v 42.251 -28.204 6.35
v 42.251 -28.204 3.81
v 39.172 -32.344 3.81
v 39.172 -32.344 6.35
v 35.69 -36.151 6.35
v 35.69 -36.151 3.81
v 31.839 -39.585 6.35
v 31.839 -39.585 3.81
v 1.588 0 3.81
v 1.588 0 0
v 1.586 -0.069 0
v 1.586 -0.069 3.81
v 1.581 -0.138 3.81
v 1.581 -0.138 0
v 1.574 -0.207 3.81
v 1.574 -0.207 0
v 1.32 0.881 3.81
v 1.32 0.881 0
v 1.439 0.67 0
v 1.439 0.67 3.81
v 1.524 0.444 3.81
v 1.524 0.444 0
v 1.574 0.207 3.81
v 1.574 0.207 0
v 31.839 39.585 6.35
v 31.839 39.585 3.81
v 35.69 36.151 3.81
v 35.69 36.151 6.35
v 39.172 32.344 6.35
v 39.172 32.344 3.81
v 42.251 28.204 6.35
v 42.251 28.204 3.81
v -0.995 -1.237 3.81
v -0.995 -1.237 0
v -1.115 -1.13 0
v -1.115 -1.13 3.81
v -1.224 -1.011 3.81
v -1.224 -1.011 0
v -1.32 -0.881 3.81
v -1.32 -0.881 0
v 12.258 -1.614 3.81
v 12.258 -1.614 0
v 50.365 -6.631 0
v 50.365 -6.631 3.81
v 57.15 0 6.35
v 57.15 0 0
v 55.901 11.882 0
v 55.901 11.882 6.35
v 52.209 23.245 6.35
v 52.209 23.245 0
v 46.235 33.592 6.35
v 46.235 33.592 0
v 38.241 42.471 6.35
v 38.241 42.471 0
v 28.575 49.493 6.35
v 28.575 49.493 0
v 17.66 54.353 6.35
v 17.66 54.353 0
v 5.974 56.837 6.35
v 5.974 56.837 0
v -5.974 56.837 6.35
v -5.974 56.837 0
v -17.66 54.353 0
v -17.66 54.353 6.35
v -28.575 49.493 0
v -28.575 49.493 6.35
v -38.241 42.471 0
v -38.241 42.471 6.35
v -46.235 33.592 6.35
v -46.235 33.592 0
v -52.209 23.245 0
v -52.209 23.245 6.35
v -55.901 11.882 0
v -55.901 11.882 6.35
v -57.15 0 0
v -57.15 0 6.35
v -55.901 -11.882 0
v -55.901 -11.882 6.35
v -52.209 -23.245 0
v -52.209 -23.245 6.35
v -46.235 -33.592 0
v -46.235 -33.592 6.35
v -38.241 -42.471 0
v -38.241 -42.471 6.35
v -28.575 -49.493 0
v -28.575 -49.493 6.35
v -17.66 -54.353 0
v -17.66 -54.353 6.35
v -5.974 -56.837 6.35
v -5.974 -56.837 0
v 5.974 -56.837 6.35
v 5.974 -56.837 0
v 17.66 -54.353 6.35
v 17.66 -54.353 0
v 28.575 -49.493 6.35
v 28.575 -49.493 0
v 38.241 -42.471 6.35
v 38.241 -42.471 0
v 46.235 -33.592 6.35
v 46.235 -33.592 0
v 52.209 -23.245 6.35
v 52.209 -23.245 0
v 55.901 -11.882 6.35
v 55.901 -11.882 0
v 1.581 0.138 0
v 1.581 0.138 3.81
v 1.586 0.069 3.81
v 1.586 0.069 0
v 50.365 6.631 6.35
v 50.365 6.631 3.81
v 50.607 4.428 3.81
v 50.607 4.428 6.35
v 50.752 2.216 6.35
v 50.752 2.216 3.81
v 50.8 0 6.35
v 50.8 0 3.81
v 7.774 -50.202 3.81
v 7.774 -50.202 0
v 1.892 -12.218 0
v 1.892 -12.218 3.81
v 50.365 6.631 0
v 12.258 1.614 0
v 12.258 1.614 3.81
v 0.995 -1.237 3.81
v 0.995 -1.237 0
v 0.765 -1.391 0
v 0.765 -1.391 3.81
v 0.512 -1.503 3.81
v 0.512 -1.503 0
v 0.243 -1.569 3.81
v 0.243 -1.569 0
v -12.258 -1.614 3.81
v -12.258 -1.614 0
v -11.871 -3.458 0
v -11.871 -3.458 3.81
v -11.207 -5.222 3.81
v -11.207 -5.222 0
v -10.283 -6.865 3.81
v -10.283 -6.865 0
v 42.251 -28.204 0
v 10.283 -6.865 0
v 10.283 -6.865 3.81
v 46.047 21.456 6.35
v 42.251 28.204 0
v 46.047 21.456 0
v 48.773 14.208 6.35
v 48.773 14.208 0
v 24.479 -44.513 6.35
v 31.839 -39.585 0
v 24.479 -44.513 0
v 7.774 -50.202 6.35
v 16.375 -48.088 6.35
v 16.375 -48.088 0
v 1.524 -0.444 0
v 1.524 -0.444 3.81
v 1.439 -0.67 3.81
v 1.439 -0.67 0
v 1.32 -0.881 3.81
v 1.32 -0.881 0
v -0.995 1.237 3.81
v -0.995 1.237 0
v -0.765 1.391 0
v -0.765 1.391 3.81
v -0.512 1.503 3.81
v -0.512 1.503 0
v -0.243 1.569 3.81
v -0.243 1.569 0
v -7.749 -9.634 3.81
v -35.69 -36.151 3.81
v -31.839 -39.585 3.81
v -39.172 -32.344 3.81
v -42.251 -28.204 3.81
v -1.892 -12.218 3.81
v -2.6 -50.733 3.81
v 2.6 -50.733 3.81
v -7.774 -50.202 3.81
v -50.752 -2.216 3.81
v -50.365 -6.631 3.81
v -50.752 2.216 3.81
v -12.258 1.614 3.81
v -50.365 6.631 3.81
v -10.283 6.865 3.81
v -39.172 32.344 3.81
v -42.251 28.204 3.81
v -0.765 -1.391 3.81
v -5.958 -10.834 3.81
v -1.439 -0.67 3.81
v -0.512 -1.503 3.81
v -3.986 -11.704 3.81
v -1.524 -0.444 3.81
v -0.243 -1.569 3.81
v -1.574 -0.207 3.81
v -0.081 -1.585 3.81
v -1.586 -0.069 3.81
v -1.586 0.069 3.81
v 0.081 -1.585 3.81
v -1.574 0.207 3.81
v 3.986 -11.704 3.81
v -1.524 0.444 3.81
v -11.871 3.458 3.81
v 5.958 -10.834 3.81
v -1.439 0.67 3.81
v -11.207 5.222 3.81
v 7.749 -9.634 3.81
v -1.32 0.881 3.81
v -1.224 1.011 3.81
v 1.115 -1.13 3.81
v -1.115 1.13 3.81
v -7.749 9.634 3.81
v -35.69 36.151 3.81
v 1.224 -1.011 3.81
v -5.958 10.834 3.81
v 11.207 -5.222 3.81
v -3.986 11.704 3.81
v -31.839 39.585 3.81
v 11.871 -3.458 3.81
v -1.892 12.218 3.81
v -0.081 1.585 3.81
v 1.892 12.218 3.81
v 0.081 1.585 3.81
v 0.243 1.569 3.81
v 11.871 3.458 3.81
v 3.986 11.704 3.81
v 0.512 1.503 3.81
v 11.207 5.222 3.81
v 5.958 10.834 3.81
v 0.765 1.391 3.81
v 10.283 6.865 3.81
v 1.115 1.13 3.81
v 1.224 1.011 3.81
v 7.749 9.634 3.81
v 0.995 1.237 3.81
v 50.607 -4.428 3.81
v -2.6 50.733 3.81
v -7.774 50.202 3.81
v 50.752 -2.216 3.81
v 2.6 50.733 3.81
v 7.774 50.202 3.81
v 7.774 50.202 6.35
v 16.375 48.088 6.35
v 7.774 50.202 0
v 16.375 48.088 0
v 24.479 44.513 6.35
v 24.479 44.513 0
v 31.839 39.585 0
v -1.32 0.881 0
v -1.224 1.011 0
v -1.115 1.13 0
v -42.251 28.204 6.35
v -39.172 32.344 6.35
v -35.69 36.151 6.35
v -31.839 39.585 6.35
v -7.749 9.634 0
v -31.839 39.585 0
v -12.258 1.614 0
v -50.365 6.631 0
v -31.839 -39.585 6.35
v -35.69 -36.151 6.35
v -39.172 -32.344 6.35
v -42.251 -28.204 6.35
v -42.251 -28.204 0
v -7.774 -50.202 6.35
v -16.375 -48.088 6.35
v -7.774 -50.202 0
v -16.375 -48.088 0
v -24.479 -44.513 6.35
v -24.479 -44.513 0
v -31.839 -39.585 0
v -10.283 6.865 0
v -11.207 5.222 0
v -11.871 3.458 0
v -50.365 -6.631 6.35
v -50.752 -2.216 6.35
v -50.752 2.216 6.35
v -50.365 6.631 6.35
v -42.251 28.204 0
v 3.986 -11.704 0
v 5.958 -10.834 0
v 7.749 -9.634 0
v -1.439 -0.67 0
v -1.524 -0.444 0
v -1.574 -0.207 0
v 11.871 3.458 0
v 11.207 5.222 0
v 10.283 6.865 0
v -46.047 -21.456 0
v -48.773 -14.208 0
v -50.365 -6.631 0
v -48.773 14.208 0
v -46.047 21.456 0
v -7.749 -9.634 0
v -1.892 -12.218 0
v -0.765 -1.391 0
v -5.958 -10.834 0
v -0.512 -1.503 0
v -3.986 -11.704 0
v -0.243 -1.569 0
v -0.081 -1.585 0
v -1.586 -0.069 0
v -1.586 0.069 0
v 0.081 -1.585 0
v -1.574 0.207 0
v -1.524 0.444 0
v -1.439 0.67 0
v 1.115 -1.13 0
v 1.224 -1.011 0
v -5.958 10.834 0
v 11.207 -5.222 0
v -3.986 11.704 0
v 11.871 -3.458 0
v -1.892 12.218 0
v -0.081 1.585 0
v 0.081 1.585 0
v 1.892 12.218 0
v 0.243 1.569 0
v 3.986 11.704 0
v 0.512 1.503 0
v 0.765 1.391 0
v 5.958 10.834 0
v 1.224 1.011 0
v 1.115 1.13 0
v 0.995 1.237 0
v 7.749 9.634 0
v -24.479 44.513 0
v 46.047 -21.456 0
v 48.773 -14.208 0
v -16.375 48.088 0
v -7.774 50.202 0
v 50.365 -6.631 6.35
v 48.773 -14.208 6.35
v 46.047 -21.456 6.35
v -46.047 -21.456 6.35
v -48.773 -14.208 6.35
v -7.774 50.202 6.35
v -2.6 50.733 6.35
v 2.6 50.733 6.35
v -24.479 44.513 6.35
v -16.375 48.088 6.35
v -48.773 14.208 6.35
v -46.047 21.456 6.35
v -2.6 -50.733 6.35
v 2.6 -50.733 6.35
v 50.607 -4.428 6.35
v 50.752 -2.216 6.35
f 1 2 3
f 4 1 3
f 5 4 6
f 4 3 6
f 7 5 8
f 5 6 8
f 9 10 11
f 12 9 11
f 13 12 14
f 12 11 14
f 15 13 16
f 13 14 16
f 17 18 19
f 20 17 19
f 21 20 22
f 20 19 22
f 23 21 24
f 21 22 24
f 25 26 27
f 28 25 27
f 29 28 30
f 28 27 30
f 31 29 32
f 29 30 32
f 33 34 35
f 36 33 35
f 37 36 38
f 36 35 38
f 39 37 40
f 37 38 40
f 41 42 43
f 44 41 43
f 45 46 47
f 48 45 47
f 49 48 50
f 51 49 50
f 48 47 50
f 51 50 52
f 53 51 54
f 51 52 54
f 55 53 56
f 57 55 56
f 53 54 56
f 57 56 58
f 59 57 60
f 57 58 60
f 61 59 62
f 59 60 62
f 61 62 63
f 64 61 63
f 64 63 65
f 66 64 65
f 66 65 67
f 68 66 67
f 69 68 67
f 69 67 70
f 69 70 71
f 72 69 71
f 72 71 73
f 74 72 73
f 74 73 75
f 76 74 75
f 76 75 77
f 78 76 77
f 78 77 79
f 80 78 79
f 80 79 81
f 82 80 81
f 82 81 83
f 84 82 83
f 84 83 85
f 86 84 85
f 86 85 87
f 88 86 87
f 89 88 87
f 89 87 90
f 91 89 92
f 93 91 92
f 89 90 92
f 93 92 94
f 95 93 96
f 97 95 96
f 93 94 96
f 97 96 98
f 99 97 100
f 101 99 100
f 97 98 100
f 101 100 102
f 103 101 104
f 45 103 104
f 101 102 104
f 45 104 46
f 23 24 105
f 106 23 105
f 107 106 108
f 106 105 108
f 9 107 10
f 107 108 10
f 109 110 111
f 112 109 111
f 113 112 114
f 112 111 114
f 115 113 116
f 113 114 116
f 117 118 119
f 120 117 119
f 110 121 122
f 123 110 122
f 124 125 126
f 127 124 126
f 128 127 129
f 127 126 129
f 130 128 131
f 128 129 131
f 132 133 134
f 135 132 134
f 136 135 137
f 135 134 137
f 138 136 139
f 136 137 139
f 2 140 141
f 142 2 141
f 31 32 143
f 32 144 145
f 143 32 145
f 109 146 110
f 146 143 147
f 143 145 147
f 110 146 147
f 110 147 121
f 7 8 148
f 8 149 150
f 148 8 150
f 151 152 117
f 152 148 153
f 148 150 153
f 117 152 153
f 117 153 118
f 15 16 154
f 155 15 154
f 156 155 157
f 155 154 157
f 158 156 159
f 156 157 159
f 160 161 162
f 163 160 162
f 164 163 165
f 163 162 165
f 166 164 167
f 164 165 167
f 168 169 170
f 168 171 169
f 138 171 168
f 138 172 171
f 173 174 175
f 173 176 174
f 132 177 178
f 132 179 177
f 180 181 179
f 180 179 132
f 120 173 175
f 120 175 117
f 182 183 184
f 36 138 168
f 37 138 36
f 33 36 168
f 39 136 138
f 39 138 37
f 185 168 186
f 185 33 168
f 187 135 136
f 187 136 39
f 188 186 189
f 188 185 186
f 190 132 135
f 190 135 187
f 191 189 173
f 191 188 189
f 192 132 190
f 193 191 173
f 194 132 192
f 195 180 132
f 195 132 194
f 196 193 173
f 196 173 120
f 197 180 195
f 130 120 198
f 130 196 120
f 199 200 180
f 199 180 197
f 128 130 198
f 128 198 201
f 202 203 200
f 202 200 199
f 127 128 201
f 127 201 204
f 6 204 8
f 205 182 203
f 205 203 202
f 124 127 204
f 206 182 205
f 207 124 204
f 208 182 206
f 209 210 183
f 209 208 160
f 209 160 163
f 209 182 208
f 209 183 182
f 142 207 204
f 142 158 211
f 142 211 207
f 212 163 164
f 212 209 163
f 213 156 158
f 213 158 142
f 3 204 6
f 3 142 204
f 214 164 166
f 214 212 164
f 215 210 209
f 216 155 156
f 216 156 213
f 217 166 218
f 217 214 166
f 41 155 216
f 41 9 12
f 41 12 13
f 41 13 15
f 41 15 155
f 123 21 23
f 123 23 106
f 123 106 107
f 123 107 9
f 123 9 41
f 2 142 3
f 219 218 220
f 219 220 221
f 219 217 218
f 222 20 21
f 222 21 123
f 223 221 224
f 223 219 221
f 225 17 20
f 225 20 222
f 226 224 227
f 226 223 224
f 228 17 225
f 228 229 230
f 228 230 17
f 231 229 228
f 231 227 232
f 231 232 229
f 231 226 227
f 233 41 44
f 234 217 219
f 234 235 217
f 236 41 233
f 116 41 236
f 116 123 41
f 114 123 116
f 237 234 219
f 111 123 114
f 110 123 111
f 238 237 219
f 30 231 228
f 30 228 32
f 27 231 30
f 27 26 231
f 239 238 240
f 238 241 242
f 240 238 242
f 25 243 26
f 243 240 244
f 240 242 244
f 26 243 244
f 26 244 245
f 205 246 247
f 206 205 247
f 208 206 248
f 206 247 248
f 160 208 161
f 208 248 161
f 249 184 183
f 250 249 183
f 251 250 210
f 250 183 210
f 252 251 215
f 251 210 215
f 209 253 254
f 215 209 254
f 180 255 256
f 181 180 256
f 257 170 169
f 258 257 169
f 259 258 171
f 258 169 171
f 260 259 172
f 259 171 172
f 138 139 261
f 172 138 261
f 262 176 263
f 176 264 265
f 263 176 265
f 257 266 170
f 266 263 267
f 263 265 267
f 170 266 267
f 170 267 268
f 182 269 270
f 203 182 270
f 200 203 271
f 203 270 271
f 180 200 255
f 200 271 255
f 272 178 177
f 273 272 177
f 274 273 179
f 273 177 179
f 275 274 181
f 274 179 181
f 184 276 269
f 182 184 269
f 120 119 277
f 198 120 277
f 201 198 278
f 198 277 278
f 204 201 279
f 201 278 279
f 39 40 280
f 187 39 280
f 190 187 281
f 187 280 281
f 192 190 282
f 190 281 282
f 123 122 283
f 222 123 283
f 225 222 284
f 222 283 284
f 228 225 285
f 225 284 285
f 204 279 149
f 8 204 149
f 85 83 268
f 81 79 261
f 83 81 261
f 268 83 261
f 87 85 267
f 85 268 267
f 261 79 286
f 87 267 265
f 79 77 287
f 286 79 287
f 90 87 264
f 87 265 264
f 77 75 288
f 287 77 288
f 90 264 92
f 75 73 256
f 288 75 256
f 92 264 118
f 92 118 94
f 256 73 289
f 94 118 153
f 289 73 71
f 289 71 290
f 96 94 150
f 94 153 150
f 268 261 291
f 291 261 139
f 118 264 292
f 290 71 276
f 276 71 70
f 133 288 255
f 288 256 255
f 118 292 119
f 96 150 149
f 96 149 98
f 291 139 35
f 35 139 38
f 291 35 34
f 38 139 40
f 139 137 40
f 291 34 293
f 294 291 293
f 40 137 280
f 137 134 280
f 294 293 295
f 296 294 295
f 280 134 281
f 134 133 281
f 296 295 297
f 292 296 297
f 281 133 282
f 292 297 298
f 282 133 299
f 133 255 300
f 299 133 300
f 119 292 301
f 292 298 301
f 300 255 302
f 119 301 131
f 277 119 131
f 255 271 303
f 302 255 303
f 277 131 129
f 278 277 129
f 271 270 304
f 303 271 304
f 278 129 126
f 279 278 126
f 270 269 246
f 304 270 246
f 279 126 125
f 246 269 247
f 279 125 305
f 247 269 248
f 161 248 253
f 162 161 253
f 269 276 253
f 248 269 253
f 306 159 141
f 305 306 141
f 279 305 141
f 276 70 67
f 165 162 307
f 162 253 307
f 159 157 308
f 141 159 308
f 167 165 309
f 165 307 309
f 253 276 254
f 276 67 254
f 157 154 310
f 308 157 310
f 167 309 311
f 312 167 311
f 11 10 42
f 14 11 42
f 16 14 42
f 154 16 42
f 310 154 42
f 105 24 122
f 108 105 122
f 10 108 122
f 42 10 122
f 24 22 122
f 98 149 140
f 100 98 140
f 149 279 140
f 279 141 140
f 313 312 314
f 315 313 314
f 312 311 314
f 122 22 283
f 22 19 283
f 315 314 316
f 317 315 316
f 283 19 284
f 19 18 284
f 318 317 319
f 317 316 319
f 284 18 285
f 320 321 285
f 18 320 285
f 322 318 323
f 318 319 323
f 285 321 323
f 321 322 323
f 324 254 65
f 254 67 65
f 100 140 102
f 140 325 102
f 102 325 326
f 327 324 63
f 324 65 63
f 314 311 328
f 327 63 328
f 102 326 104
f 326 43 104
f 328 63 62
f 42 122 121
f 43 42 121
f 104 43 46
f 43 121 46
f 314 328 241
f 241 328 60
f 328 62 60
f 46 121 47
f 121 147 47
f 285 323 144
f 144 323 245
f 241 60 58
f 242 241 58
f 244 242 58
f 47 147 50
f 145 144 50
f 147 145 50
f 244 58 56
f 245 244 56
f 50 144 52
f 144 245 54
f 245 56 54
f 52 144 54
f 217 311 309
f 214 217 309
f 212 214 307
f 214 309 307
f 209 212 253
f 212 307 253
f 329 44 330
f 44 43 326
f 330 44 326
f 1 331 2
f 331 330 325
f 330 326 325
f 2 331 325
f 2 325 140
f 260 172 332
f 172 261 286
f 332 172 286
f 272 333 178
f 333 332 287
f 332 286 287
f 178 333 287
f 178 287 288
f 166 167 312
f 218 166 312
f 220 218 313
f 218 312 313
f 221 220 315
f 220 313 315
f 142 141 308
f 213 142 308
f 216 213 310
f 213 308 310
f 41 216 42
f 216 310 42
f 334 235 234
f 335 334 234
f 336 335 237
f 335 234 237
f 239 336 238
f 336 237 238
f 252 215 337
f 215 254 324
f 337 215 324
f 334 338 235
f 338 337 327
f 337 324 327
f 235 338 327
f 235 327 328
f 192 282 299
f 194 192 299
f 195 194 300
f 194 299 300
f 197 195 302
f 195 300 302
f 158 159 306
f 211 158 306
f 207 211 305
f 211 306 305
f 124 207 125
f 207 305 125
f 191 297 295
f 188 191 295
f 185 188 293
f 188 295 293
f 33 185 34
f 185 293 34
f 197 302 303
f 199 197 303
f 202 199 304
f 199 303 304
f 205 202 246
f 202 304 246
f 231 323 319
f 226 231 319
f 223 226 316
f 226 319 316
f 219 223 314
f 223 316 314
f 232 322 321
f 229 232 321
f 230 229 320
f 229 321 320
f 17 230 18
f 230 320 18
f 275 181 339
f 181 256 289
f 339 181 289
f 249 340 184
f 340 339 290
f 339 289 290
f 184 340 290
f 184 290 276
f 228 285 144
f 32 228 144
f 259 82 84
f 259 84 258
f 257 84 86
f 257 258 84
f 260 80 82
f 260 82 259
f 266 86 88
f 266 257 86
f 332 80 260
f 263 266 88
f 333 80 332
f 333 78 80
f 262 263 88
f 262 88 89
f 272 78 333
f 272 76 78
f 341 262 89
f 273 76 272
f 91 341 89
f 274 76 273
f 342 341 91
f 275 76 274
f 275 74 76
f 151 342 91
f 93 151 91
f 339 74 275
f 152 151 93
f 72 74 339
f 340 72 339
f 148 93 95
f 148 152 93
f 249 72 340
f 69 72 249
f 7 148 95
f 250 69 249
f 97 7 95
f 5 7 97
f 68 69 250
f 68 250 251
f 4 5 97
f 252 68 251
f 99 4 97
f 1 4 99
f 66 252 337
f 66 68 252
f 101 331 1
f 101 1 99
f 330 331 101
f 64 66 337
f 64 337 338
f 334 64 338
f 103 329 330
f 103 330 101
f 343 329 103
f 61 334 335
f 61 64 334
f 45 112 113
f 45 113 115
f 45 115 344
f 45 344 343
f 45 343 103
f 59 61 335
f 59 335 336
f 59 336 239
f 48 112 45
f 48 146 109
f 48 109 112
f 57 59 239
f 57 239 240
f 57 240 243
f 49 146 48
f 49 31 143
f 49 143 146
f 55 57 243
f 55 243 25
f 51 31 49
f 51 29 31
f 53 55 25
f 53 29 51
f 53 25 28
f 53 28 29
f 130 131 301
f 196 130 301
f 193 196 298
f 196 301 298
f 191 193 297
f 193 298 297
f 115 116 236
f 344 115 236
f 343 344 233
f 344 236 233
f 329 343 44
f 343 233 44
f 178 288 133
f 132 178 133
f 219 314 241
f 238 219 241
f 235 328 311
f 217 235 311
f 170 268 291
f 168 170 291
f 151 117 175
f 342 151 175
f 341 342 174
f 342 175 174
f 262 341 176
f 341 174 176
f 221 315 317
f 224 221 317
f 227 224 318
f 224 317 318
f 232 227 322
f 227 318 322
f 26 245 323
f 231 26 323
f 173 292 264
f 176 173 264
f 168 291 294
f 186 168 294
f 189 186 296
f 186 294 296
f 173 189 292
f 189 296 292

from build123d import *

# Parameters (mm, degrees)
F0_R     = 57.15
F1_DEPTH = 6.35
F2_DEPTH = 3.81


with BuildPart() as f1:
    # F0 (on Top) → F1 (new body)
    with BuildSketch(Plane.XY):
        Circle(F0_R)
        with BuildLine():
            ThreePointArc((50.3653989578, 6.6307305648), (50.6912333005, 3.3224789649), (50.8, 0))
            ThreePointArc((50.8, 0), (50.6912333005, -3.3224789649), (50.3653989578, -6.6307305648))
            ThreePointArc((50.3653989578, -6.6307305648), (47.547955486, -17.8838454786), (42.2510665707, -28.2043857164))
            ThreePointArc((42.2510665707, -28.2043857164), (37.479329155, -34.2919799092), (31.8386895146, -39.5845658053))
            ThreePointArc((31.8386895146, -39.5845658053), (20.505293032, -46.4776608455), (7.7737455542, -50.2016820441))
            ThreePointArc((7.7737455542, -50.2016820441), (0, -50.8), (-7.7737455542, -50.2016820441))
            ThreePointArc((-7.7737455542, -50.2016820441), (-20.505293032, -46.4776608455), (-31.8386895146, -39.5845658053))
            ThreePointArc((-31.8386895146, -39.5845658053), (-37.479329155, -34.2919799092), (-42.2510665707, -28.2043857164))
            ThreePointArc((-42.2510665707, -28.2043857164), (-47.547955486, -17.8838454786), (-50.3653989578, -6.6307305648))
            ThreePointArc((-50.3653989578, -6.6307305648), (-50.8, 0), (-50.3653989578, 6.6307305648))
            ThreePointArc((-50.3653989578, 6.6307305648), (-47.547955486, 17.8838454786), (-42.2510665707, 28.2043857164))
            ThreePointArc((-42.2510665707, 28.2043857164), (-37.479329155, 34.2919799092), (-31.8386895146, 39.5845658053))
            ThreePointArc((-31.8386895146, 39.5845658053), (-20.505293032, 46.4776608455), (-7.7737455542, 50.2016820441))
            ThreePointArc((-7.7737455542, 50.2016820441), (0, 50.8), (7.7737455542, 50.2016820441))
            ThreePointArc((7.7737455542, 50.2016820441), (20.505293032, 46.4776608455), (31.8386895146, 39.5845658053))
            ThreePointArc((31.8386895146, 39.5845658053), (37.479329155, 34.2919799092), (42.2510665707, 28.2043857164))
            ThreePointArc((42.2510665707, 28.2043857164), (47.547955486, 17.8838454786), (50.3653989578, 6.6307305648))
        make_face(mode=Mode.SUBTRACT)
    extrude(amount=F1_DEPTH)

    # F0 (on Top) → F2 (join)
    with BuildSketch(Plane.XY):
        Circle(F0_R)
        with BuildLine():
            ThreePointArc((50.3653989578, 6.6307305648), (50.6912333005, 3.3224789649), (50.8, 0))
            ThreePointArc((50.8, 0), (50.6912333005, -3.3224789649), (50.3653989578, -6.6307305648))
            ThreePointArc((50.3653989578, -6.6307305648), (47.547955486, -17.8838454786), (42.2510665707, -28.2043857164))
            ThreePointArc((42.2510665707, -28.2043857164), (37.479329155, -34.2919799092), (31.8386895146, -39.5845658053))
            ThreePointArc((31.8386895146, -39.5845658053), (20.505293032, -46.4776608455), (7.7737455542, -50.2016820441))
            ThreePointArc((7.7737455542, -50.2016820441), (0, -50.8), (-7.7737455542, -50.2016820441))
            ThreePointArc((-7.7737455542, -50.2016820441), (-20.505293032, -46.4776608455), (-31.8386895146, -39.5845658053))
            ThreePointArc((-31.8386895146, -39.5845658053), (-37.479329155, -34.2919799092), (-42.2510665707, -28.2043857164))
            ThreePointArc((-42.2510665707, -28.2043857164), (-47.547955486, -17.8838454786), (-50.3653989578, -6.6307305648))
            ThreePointArc((-50.3653989578, -6.6307305648), (-50.8, 0), (-50.3653989578, 6.6307305648))
            ThreePointArc((-50.3653989578, 6.6307305648), (-47.547955486, 17.8838454786), (-42.2510665707, 28.2043857164))
            ThreePointArc((-42.2510665707, 28.2043857164), (-37.479329155, 34.2919799092), (-31.8386895146, 39.5845658053))
            ThreePointArc((-31.8386895146, 39.5845658053), (-20.505293032, 46.4776608455), (-7.7737455542, 50.2016820441))
            ThreePointArc((-7.7737455542, 50.2016820441), (0, 50.8), (7.7737455542, 50.2016820441))
            ThreePointArc((7.7737455542, 50.2016820441), (20.505293032, 46.4776608455), (31.8386895146, 39.5845658053))
            ThreePointArc((31.8386895146, 39.5845658053), (37.479329155, 34.2919799092), (42.2510665707, 28.2043857164))
            ThreePointArc((42.2510665707, 28.2043857164), (47.547955486, 17.8838454786), (50.3653989578, 6.6307305648))
        make_face(mode=Mode.SUBTRACT)
        with BuildLine():
            Line((-7.7491279332, 9.6343746957), (-31.8386895146, 39.5845658053))
            ThreePointArc((-31.8386895146, 39.5845658053), (-37.479329155, 34.2919799092), (-42.2510665707, 28.2043857164))
            Line((-42.2510665707, 28.2043857164), (-10.2833667202, 6.8645850858))
            ThreePointArc((-10.2833667202, 6.8645850858), (-9.1219871452, 8.3462272929), (-7.7491279332, 9.6343746957))
        make_face()
        with BuildLine():
            Line((1.8920297832, 12.2184443691), (7.7737455542, 50.2016820441))
            ThreePointArc((7.7737455542, 50.2016820441), (0, 50.8), (-7.7737455542, 50.2016820441))
            Line((-7.7737455542, 50.2016820441), (-1.8920297832, 12.2184443691))
            ThreePointArc((-1.8920297832, 12.2184443691), (0, 12.3640672718), (1.8920297832, 12.2184443691))
        make_face()
        with BuildLine():
            Line((10.2833667202, 6.8645850858), (42.2510665707, 28.2043857164))
            ThreePointArc((42.2510665707, 28.2043857164), (37.479329155, 34.2919799092), (31.8386895146, 39.5845658053))
            Line((31.8386895146, 39.5845658053), (7.7491279332, 9.6343746957))
            ThreePointArc((7.7491279332, 9.6343746957), (9.1219871452, 8.3462272929), (10.2833667202, 6.8645850858))
        make_face()
        with BuildLine():
            ThreePointArc((50.3653989578, -6.6307305648), (50.6912333005, -3.3224789649), (50.8, 0))
            ThreePointArc((50.8, 0), (50.6912333005, 3.3224789649), (50.3653989578, 6.6307305648))
            Line((50.3653989578, 6.6307305648), (12.2582909623, 1.6138346213))
            ThreePointArc((12.2582909623, 1.6138346213), (12.3375948547, 0.8086486896), (12.3640672718, 0))
            ThreePointArc((12.3640672718, 0), (12.3375948547, -0.8086486896), (12.2582909623, -1.6138346213))
            Line((12.2582909623, -1.6138346213), (50.3653989578, -6.6307305648))
        make_face()
        with BuildLine():
            ThreePointArc((31.8386895146, -39.5845658053), (37.479329155, -34.2919799092), (42.2510665707, -28.2043857164))
            Line((42.2510665707, -28.2043857164), (10.2833667202, -6.8645850858))
            ThreePointArc((10.2833667202, -6.8645850858), (9.1219871452, -8.3462272929), (7.7491279332, -9.6343746957))
            Line((7.7491279332, -9.6343746957), (31.8386895146, -39.5845658053))
        make_face()
        with BuildLine():
            ThreePointArc((-7.7737455542, -50.2016820441), (0, -50.8), (7.7737455542, -50.2016820441))
            Line((7.7737455542, -50.2016820441), (1.8920297832, -12.2184443691))
            ThreePointArc((1.8920297832, -12.2184443691), (0, -12.3640672718), (-1.8920297832, -12.2184443691))
            Line((-1.8920297832, -12.2184443691), (-7.7737455542, -50.2016820441))
        make_face()
        with BuildLine():
            Line((-31.8386895146, -39.5845658053), (-7.7491279332, -9.6343746957))
            ThreePointArc((-7.7491279332, -9.6343746957), (-9.1219871452, -8.3462272929), (-10.2833667202, -6.8645850858))
            Line((-10.2833667202, -6.8645850858), (-42.2510665707, -28.2043857164))
            ThreePointArc((-42.2510665707, -28.2043857164), (-37.479329155, -34.2919799092), (-31.8386895146, -39.5845658053))
        make_face()
        with BuildLine():
            ThreePointArc((-12.2582909623, -1.6138346213), (-12.3640672718, 0), (-12.2582909623, 1.6138346213))
            Line((-12.2582909623, 1.6138346213), (-50.3653989578, 6.6307305648))
            ThreePointArc((-50.3653989578, 6.6307305648), (-50.8, 0), (-50.3653989578, -6.6307305648))
            Line((-50.3653989578, -6.6307305648), (-12.2582909623, -1.6138346213))
        make_face()
        with BuildLine():
            ThreePointArc((1.8920297832, -12.2184443691), (4.9907248519, -11.3120654592), (7.7491279332, -9.6343746957))
            Line((7.7491279332, -9.6343746957), (0.9949590473, -1.2370176814))
            ThreePointArc((0.9949590473, -1.2370176814), (0.6407904073, -1.4524269014), (0.2429295486, -1.5688025639))
            Line((0.2429295486, -1.5688025639), (1.8920297832, -12.2184443691))
        make_face()
        with BuildLine():
            ThreePointArc((10.2833667202, -6.8645850858), (11.5725614225, -4.3526982003), (12.2582909623, -1.6138346213))
            Line((12.2582909623, -1.6138346213), (1.5739187174, -0.2072103301))
            ThreePointArc((1.5739187174, -0.2072103301), (1.4858736089, -0.5588701712), (1.3203458303, -0.8813870536))
            Line((1.3203458303, -0.8813870536), (10.2833667202, -6.8645850858))
        make_face()
        with BuildLine():
            Line((1.5739187174, 0.2072103301), (12.2582909623, 1.6138346213))
            ThreePointArc((12.2582909623, 1.6138346213), (11.5725614225, 4.3526982003), (10.2833667202, 6.8645850858))
            Line((10.2833667202, 6.8645850858), (1.3203458303, 0.8813870536))
            ThreePointArc((1.3203458303, 0.8813870536), (1.4858736089, 0.5588701712), (1.5739187174, 0.2072103301))
        make_face()
        with BuildLine():
            Line((0.9949590473, 1.2370176814), (7.7491279332, 9.6343746957))
            ThreePointArc((7.7491279332, 9.6343746957), (4.9907248519, 11.3120654592), (1.8920297832, 12.2184443691))
            Line((1.8920297832, 12.2184443691), (0.2429295486, 1.5688025639))
            ThreePointArc((0.2429295486, 1.5688025639), (0.6407904073, 1.4524269014), (0.9949590473, 1.2370176814))
        make_face()
        with BuildLine():
            ThreePointArc((-0.9949590473, 1.2370176814), (-0.6407904073, 1.4524269014), (-0.2429295486, 1.5688025639))
            Line((-0.2429295486, 1.5688025639), (-1.8920297832, 12.2184443691))
            ThreePointArc((-1.8920297832, 12.2184443691), (-4.9907248519, 11.3120654592), (-7.7491279332, 9.6343746957))
            Line((-7.7491279332, 9.6343746957), (-0.9949590473, 1.2370176814))
        make_face()
        with BuildLine():
            Line((-12.2582909623, 1.6138346213), (-1.5739187174, 0.2072103301))
            ThreePointArc((-1.5739187174, 0.2072103301), (-1.4858736089, 0.5588701712), (-1.3203458303, 0.8813870536))
            Line((-1.3203458303, 0.8813870536), (-10.2833667202, 6.8645850858))
            ThreePointArc((-10.2833667202, 6.8645850858), (-11.5725614225, 4.3526982003), (-12.2582909623, 1.6138346213))
        make_face()
        with BuildLine():
            ThreePointArc((-0.2429295486, -1.5688025639), (-0.6407904073, -1.4524269014), (-0.9949590473, -1.2370176814))
            Line((-0.9949590473, -1.2370176814), (-7.7491279332, -9.6343746957))
            ThreePointArc((-7.7491279332, -9.6343746957), (-4.9907248519, -11.3120654592), (-1.8920297832, -12.2184443691))
            Line((-1.8920297832, -12.2184443691), (-0.2429295486, -1.5688025639))
        make_face()
        with BuildLine():
            Line((1.8920297832, -12.2184443691), (0.2429295486, -1.5688025639))
            ThreePointArc((0.2429295486, -1.5688025639), (0, -1.5875), (-0.2429295486, -1.5688025639))
            Line((-0.2429295486, -1.5688025639), (-1.8920297832, -12.2184443691))
            ThreePointArc((-1.8920297832, -12.2184443691), (0, -12.3640672718), (1.8920297832, -12.2184443691))
        make_face()
        with BuildLine():
            ThreePointArc((7.7491279332, -9.6343746957), (9.1219871452, -8.3462272929), (10.2833667202, -6.8645850858))
            Line((10.2833667202, -6.8645850858), (1.3203458303, -0.8813870536))
            ThreePointArc((1.3203458303, -0.8813870536), (1.1712290361, -1.0716243722), (0.9949590473, -1.2370176814))
            Line((0.9949590473, -1.2370176814), (7.7491279332, -9.6343746957))
        make_face()
        with BuildLine():
            ThreePointArc((12.3640672718, 0), (12.3375948547, 0.8086486896), (12.2582909623, 1.6138346213))
            Line((12.2582909623, 1.6138346213), (1.5739187174, 0.2072103301))
            ThreePointArc((1.5739187174, 0.2072103301), (1.5841010406, 0.1038274677), (1.5875, 0))
            ThreePointArc((1.5875, 0), (1.5841010406, -0.1038274677), (1.5739187174, -0.2072103301))
            Line((1.5739187174, -0.2072103301), (12.2582909623, -1.6138346213))
            ThreePointArc((12.2582909623, -1.6138346213), (12.3375948547, -0.8086486896), (12.3640672718, 0))
        make_face()
        with BuildLine():
            Line((1.3203458303, 0.8813870536), (10.2833667202, 6.8645850858))
            ThreePointArc((10.2833667202, 6.8645850858), (9.1219871452, 8.3462272929), (7.7491279332, 9.6343746957))
            Line((7.7491279332, 9.6343746957), (0.9949590473, 1.2370176814))
            ThreePointArc((0.9949590473, 1.2370176814), (1.1712290361, 1.0716243722), (1.3203458303, 0.8813870536))
        make_face()
        with BuildLine():
            Line((0.2429295486, 1.5688025639), (1.8920297832, 12.2184443691))
            ThreePointArc((1.8920297832, 12.2184443691), (0, 12.3640672718), (-1.8920297832, 12.2184443691))
            Line((-1.8920297832, 12.2184443691), (-0.2429295486, 1.5688025639))
            ThreePointArc((-0.2429295486, 1.5688025639), (0, 1.5875), (0.2429295486, 1.5688025639))
        make_face()
        with BuildLine():
            Line((-10.2833667202, 6.8645850858), (-1.3203458303, 0.8813870536))
            ThreePointArc((-1.3203458303, 0.8813870536), (-1.1712290361, 1.0716243722), (-0.9949590473, 1.2370176814))
            Line((-0.9949590473, 1.2370176814), (-7.7491279332, 9.6343746957))
            ThreePointArc((-7.7491279332, 9.6343746957), (-9.1219871452, 8.3462272929), (-10.2833667202, 6.8645850858))
        make_face()
        with BuildLine():
            Line((-7.7491279332, -9.6343746957), (-0.9949590473, -1.2370176814))
            ThreePointArc((-0.9949590473, -1.2370176814), (-1.1712290361, -1.0716243722), (-1.3203458303, -0.8813870536))
            Line((-1.3203458303, -0.8813870536), (-10.2833667202, -6.8645850858))
            ThreePointArc((-10.2833667202, -6.8645850858), (-9.1219871452, -8.3462272929), (-7.7491279332, -9.6343746957))
        make_face()
        with BuildLine():
            ThreePointArc((-1.5739187174, -0.2072103301), (-1.5875, 0), (-1.5739187174, 0.2072103301))
            Line((-1.5739187174, 0.2072103301), (-12.2582909623, 1.6138346213))
            ThreePointArc((-12.2582909623, 1.6138346213), (-12.3640672718, 0), (-12.2582909623, -1.6138346213))
            Line((-12.2582909623, -1.6138346213), (-1.5739187174, -0.2072103301))
        make_face()
        with BuildLine():
            Line((-10.2833667202, -6.8645850858), (-1.3203458303, -0.8813870536))
            ThreePointArc((-1.3203458303, -0.8813870536), (-1.4858736089, -0.5588701712), (-1.5739187174, -0.2072103301))
            Line((-1.5739187174, -0.2072103301), (-12.2582909623, -1.6138346213))
            ThreePointArc((-12.2582909623, -1.6138346213), (-11.5725614225, -4.3526982003), (-10.2833667202, -6.8645850858))
        make_face()
    extrude(amount=F2_DEPTH)


solid = f1.part
